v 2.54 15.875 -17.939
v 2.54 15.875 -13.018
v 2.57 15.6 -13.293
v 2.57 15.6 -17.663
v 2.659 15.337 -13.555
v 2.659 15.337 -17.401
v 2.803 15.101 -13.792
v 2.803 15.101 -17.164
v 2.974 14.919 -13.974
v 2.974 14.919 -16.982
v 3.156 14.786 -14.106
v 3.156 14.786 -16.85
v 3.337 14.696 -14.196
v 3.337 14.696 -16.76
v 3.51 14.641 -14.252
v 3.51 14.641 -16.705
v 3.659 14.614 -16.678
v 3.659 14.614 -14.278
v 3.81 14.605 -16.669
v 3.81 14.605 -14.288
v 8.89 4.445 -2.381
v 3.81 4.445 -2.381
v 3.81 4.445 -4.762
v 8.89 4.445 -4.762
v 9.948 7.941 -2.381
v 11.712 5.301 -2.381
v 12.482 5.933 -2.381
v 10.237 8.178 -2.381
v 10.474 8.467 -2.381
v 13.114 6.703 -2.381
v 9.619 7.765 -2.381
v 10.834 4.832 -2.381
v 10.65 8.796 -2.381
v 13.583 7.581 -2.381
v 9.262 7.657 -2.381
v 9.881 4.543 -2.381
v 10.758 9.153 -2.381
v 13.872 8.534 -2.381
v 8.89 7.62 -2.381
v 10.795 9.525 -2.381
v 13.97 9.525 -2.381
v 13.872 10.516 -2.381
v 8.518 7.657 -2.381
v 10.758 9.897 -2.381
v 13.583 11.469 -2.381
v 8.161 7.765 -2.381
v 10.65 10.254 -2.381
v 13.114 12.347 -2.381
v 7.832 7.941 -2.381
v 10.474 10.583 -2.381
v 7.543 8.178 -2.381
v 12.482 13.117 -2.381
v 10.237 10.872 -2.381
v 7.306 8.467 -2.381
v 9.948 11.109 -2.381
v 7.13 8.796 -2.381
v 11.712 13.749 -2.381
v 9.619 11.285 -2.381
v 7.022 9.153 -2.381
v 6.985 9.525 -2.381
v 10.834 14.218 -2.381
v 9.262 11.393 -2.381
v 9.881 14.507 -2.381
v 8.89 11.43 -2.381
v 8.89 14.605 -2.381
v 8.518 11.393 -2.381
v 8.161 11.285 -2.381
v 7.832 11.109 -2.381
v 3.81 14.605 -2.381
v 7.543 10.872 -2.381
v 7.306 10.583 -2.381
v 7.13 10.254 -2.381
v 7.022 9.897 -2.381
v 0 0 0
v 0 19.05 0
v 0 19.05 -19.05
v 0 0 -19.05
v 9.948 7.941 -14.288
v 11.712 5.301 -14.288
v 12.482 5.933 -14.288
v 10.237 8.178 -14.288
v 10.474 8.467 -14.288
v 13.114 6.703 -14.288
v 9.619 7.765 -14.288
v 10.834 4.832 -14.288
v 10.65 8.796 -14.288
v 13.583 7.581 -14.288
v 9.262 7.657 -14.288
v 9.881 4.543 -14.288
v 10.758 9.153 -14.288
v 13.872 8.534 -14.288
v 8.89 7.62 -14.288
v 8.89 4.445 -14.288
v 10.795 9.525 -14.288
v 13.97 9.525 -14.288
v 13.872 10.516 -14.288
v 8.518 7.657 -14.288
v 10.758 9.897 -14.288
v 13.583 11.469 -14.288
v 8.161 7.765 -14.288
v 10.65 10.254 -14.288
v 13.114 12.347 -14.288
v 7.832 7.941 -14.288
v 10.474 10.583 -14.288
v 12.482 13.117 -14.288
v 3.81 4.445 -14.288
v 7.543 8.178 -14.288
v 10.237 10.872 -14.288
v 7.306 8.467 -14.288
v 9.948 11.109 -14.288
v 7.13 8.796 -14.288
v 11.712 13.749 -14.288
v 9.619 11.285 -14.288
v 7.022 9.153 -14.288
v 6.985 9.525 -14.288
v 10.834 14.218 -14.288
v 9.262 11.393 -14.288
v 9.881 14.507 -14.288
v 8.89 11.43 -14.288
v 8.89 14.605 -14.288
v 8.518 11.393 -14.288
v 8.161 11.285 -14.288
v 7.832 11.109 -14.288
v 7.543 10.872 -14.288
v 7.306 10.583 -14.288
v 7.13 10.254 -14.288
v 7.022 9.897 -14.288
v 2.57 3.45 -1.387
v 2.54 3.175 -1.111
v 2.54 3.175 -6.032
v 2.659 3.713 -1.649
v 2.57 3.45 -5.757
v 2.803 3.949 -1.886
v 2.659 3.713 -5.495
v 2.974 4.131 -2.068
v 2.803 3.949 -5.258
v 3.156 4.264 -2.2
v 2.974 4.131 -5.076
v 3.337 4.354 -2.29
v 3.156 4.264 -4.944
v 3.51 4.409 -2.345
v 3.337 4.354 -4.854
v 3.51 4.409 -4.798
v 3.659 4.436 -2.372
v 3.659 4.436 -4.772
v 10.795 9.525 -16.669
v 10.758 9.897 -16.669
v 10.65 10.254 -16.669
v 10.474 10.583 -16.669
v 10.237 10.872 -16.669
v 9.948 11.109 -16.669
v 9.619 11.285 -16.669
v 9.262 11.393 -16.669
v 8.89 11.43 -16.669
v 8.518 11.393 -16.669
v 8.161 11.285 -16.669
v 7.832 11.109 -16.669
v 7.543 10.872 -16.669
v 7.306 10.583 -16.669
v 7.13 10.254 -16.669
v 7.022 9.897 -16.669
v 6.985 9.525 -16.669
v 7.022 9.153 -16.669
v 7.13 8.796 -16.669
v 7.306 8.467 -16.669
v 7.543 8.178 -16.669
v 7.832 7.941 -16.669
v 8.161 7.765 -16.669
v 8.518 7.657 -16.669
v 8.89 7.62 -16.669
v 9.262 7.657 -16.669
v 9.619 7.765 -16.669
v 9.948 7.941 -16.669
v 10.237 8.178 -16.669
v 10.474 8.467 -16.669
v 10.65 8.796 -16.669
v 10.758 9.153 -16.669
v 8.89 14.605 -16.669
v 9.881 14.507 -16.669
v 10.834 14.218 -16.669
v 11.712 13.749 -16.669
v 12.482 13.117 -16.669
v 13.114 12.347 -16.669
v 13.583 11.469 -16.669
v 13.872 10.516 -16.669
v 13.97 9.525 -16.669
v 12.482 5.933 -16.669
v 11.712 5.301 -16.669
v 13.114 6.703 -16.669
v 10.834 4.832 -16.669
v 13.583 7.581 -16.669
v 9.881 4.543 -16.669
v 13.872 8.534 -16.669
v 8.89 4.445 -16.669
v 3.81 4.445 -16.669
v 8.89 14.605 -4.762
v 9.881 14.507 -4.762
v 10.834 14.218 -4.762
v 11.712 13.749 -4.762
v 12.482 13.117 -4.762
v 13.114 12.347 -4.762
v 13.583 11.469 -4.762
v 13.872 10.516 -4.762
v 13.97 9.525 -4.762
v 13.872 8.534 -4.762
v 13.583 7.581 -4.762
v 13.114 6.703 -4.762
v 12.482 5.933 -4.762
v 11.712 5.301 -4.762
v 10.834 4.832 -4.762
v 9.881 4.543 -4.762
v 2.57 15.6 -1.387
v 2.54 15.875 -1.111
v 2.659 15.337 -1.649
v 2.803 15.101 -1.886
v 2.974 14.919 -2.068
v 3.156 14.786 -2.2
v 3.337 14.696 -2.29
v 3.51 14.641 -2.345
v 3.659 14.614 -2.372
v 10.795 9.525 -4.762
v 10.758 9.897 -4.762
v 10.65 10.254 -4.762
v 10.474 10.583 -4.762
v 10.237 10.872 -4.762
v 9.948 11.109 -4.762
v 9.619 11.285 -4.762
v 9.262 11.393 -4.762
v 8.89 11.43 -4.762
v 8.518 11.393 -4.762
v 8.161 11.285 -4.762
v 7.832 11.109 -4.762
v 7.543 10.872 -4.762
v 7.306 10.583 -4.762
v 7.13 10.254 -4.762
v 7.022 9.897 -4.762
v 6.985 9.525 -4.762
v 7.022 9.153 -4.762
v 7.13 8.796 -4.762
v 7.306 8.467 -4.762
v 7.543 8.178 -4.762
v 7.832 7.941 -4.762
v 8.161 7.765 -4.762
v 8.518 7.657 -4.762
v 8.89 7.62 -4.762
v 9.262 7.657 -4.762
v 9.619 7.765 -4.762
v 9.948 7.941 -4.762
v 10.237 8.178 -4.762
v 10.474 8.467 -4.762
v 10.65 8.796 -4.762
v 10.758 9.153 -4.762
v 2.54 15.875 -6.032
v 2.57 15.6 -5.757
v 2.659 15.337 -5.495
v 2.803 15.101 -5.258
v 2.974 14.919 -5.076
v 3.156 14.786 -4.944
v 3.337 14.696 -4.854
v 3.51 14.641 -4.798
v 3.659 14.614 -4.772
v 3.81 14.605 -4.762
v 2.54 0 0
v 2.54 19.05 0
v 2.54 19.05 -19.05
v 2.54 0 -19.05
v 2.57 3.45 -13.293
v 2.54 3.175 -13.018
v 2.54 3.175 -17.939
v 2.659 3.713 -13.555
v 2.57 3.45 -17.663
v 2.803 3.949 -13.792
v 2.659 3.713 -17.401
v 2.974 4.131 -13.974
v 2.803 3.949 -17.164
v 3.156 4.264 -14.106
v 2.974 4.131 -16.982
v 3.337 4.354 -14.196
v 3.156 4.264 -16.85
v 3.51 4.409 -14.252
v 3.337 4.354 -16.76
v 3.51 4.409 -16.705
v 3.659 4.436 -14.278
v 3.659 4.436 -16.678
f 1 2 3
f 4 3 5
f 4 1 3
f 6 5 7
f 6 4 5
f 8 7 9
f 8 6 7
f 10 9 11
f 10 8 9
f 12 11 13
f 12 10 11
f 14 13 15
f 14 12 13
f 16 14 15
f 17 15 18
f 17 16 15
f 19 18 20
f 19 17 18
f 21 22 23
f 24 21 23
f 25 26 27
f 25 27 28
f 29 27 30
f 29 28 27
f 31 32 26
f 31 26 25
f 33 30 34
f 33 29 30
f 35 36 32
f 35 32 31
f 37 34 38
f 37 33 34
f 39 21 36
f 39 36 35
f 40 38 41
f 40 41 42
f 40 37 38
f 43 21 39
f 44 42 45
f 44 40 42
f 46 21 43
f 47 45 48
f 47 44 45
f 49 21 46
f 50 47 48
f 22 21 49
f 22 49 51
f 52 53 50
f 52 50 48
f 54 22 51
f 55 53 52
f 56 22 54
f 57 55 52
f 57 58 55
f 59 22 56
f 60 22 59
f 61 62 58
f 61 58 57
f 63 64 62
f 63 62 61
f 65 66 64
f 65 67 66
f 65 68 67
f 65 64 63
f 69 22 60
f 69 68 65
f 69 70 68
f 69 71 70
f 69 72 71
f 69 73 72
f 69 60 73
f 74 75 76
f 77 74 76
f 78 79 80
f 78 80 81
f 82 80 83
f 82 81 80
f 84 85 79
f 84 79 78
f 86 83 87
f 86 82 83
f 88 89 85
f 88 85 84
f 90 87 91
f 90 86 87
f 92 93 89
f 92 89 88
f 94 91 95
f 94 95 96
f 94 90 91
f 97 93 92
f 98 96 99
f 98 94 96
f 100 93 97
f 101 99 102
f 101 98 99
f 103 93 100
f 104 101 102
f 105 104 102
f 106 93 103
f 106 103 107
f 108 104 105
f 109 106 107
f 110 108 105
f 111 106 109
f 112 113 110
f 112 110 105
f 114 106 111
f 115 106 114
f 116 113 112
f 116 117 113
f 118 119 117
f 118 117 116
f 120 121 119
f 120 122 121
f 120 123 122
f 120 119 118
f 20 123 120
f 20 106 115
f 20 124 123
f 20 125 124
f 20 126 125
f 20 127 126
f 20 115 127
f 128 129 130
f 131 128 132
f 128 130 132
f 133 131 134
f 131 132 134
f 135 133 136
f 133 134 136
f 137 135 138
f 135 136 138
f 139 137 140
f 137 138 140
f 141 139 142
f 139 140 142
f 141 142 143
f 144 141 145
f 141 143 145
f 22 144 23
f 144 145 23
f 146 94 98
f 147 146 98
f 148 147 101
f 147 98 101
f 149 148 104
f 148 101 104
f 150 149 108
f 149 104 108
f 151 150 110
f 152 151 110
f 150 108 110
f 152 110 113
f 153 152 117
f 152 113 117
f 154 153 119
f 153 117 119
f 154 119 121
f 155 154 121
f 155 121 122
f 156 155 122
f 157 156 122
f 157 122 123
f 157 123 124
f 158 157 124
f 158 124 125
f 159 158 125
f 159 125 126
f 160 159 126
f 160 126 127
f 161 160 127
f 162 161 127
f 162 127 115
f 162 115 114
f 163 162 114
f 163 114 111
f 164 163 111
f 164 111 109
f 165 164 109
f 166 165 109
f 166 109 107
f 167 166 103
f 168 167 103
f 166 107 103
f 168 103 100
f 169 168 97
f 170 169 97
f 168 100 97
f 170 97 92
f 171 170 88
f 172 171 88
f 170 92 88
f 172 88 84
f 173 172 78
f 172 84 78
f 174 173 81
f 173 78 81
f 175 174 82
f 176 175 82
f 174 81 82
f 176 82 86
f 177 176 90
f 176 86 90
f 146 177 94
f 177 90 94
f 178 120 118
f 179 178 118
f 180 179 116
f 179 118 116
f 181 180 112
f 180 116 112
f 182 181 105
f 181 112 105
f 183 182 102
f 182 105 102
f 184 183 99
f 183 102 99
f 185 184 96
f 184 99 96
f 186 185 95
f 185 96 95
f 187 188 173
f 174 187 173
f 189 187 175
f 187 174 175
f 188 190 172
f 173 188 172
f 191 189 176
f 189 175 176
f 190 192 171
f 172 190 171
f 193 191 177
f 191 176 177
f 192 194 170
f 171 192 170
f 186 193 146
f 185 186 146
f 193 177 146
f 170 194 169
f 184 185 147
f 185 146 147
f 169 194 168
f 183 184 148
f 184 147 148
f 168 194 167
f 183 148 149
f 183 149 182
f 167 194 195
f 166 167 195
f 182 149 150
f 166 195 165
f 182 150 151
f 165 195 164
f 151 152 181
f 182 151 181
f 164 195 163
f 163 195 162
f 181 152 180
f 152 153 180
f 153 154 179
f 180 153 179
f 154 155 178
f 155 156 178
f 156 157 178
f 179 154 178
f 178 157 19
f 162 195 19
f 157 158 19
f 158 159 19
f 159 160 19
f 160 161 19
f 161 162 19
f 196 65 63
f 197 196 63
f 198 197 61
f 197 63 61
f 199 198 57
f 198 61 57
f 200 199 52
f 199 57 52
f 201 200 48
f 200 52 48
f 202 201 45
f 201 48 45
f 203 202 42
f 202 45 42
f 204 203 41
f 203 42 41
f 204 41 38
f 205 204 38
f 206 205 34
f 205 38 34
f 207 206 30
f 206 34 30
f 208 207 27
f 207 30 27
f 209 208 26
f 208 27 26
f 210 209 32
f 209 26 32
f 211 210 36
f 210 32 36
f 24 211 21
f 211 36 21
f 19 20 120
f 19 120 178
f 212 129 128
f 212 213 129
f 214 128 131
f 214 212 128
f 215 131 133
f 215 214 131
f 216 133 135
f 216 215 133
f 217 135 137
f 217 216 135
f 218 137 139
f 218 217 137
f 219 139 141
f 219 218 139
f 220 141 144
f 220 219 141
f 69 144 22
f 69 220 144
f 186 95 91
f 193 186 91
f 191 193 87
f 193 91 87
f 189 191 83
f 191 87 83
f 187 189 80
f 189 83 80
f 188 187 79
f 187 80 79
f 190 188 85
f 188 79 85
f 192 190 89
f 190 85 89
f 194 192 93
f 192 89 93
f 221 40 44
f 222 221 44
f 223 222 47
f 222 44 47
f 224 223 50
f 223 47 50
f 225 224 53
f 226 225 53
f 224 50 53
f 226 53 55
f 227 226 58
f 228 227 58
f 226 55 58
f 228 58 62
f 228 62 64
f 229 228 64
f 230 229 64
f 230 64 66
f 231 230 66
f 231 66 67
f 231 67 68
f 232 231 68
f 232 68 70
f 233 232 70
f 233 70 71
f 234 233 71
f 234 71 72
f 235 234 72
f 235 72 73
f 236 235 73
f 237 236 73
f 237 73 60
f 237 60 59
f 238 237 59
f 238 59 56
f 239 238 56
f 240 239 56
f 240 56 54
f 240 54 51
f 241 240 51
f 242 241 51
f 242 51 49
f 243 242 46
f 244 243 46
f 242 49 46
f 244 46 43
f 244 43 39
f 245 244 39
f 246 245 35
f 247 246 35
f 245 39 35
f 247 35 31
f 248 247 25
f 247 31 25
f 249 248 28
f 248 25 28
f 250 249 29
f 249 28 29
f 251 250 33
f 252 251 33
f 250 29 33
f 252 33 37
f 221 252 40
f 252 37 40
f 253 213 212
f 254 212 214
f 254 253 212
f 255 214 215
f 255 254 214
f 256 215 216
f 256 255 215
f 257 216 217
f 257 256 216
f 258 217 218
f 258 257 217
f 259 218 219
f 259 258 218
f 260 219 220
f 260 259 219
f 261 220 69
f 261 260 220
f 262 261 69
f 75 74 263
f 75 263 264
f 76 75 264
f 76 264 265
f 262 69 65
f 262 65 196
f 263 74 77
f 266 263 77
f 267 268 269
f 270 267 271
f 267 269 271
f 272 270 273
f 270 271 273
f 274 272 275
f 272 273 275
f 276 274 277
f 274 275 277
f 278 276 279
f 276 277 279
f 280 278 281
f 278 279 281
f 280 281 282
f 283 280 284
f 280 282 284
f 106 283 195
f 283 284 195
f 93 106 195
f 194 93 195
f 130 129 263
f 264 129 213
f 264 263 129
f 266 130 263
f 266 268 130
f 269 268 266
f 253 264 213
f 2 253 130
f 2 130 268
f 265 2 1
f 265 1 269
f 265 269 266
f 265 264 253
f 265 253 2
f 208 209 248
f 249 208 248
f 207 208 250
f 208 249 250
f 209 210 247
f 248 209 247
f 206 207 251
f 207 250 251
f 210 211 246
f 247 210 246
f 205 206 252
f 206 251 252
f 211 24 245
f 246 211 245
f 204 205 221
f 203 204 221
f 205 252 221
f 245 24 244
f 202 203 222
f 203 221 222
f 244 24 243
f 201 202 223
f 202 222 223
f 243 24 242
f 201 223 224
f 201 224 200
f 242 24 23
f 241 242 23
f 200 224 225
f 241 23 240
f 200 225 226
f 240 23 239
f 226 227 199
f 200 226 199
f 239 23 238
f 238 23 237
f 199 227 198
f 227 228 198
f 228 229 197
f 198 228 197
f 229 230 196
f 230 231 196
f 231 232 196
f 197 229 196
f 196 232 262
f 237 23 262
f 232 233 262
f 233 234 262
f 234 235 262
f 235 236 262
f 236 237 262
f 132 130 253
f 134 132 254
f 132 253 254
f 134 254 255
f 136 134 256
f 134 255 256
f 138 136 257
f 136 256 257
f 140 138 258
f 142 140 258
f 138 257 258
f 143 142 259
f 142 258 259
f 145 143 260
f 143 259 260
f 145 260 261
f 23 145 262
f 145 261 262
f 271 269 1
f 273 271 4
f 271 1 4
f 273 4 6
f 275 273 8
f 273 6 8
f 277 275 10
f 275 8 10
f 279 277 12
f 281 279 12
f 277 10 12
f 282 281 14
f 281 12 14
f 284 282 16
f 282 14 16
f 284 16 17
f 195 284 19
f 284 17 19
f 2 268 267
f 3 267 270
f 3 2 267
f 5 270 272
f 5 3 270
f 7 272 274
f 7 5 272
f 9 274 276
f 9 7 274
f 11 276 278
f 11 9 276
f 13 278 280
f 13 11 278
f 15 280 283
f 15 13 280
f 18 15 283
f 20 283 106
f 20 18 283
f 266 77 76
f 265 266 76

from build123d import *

# Parameters (mm, degrees)
SKETCH2_W           = 19.05
SKETCH2_H           = 19.05
BOSS_EXTRUDE2_DEPTH = 2.54
SKETCH3_W           = 2.38125
SKETCH3_H           = 10.16
BOSS_EXTRUDE3_DEPTH = 11.43
CUT_EXTRUDE1_DEPTH  = 29.912119026
SKETCH4_4_R         = 1.905
CUT_EXTRUDE2_DEPTH  = 29.912119026
FILLET3_R           = 1.27


with BuildPart() as part:
    # Sketch2 → Boss-Extrude2 (new body)
    with BuildSketch(Plane(origin=(0, 0, 0), x_dir=(0, 0, -1), z_dir=(1, 0, 0))):
        with Locations((9.525, 9.525)):
            Rectangle(SKETCH2_W, SKETCH2_H)
    extrude(amount=BOSS_EXTRUDE2_DEPTH)

    # Sketch3 → Boss-Extrude3 (add)
    with BuildSketch(Plane(origin=(2.54, 0, 0), x_dir=(0, 0, -1), z_dir=(1, 0, 0))):
        with Locations((3.571875, 9.525)):
            Rectangle(SKETCH3_W, SKETCH3_H)
        with Locations((15.478125, 9.525)):
            Rectangle(SKETCH3_W, SKETCH3_H)
    extrude(amount=BOSS_EXTRUDE3_DEPTH)

    # Sketch4 → Cut-Extrude1 (cut, through all)
    with BuildSketch(Plane.XY.offset(-2.38125)):
        with BuildLine():
            Line((13.97, 14.605), (8.89, 14.605))
            ThreePointArc((8.89, 14.605), (12.482102448, 13.117102448), (13.97, 9.525))
            Line((13.97, 9.525), (13.97, 14.605))
        make_face()
        with BuildLine():
            Line((13.97, 4.445), (13.97, 9.525))
            ThreePointArc((13.97, 9.525), (12.482102448, 5.932897552), (8.89, 4.445))
            Line((8.89, 4.445), (13.97, 4.445))
        make_face()
    extrude(amount=-CUT_EXTRUDE1_DEPTH, mode=Mode.SUBTRACT)

    # Sketch4<4> → Cut-Extrude2 (cut, through all)
    with BuildSketch(Plane.XY.offset(-2.38125)):
        with Locations((8.89, 9.525)):
            Circle(SKETCH4_4_R)
    extrude(amount=-CUT_EXTRUDE2_DEPTH, mode=Mode.SUBTRACT)

    # Fillet3
    fillet3_edges = [part.edges().sort_by_distance(p)[0] for p in [
        (2.54, 9.525, -2.38125),
        (2.54, 4.445, -3.571875),
        (2.54, 9.525, -4.7625),
        (2.54, 14.605, -3.571875),
        (2.54, 9.525, -14.2875),
        (2.54, 4.445, -15.478125),
        (2.54, 9.525, -16.66875),
        (2.54, 14.605, -15.478125),
    ]]
    fillet(fillet3_edges, radius=FILLET3_R)


solid = part.part
